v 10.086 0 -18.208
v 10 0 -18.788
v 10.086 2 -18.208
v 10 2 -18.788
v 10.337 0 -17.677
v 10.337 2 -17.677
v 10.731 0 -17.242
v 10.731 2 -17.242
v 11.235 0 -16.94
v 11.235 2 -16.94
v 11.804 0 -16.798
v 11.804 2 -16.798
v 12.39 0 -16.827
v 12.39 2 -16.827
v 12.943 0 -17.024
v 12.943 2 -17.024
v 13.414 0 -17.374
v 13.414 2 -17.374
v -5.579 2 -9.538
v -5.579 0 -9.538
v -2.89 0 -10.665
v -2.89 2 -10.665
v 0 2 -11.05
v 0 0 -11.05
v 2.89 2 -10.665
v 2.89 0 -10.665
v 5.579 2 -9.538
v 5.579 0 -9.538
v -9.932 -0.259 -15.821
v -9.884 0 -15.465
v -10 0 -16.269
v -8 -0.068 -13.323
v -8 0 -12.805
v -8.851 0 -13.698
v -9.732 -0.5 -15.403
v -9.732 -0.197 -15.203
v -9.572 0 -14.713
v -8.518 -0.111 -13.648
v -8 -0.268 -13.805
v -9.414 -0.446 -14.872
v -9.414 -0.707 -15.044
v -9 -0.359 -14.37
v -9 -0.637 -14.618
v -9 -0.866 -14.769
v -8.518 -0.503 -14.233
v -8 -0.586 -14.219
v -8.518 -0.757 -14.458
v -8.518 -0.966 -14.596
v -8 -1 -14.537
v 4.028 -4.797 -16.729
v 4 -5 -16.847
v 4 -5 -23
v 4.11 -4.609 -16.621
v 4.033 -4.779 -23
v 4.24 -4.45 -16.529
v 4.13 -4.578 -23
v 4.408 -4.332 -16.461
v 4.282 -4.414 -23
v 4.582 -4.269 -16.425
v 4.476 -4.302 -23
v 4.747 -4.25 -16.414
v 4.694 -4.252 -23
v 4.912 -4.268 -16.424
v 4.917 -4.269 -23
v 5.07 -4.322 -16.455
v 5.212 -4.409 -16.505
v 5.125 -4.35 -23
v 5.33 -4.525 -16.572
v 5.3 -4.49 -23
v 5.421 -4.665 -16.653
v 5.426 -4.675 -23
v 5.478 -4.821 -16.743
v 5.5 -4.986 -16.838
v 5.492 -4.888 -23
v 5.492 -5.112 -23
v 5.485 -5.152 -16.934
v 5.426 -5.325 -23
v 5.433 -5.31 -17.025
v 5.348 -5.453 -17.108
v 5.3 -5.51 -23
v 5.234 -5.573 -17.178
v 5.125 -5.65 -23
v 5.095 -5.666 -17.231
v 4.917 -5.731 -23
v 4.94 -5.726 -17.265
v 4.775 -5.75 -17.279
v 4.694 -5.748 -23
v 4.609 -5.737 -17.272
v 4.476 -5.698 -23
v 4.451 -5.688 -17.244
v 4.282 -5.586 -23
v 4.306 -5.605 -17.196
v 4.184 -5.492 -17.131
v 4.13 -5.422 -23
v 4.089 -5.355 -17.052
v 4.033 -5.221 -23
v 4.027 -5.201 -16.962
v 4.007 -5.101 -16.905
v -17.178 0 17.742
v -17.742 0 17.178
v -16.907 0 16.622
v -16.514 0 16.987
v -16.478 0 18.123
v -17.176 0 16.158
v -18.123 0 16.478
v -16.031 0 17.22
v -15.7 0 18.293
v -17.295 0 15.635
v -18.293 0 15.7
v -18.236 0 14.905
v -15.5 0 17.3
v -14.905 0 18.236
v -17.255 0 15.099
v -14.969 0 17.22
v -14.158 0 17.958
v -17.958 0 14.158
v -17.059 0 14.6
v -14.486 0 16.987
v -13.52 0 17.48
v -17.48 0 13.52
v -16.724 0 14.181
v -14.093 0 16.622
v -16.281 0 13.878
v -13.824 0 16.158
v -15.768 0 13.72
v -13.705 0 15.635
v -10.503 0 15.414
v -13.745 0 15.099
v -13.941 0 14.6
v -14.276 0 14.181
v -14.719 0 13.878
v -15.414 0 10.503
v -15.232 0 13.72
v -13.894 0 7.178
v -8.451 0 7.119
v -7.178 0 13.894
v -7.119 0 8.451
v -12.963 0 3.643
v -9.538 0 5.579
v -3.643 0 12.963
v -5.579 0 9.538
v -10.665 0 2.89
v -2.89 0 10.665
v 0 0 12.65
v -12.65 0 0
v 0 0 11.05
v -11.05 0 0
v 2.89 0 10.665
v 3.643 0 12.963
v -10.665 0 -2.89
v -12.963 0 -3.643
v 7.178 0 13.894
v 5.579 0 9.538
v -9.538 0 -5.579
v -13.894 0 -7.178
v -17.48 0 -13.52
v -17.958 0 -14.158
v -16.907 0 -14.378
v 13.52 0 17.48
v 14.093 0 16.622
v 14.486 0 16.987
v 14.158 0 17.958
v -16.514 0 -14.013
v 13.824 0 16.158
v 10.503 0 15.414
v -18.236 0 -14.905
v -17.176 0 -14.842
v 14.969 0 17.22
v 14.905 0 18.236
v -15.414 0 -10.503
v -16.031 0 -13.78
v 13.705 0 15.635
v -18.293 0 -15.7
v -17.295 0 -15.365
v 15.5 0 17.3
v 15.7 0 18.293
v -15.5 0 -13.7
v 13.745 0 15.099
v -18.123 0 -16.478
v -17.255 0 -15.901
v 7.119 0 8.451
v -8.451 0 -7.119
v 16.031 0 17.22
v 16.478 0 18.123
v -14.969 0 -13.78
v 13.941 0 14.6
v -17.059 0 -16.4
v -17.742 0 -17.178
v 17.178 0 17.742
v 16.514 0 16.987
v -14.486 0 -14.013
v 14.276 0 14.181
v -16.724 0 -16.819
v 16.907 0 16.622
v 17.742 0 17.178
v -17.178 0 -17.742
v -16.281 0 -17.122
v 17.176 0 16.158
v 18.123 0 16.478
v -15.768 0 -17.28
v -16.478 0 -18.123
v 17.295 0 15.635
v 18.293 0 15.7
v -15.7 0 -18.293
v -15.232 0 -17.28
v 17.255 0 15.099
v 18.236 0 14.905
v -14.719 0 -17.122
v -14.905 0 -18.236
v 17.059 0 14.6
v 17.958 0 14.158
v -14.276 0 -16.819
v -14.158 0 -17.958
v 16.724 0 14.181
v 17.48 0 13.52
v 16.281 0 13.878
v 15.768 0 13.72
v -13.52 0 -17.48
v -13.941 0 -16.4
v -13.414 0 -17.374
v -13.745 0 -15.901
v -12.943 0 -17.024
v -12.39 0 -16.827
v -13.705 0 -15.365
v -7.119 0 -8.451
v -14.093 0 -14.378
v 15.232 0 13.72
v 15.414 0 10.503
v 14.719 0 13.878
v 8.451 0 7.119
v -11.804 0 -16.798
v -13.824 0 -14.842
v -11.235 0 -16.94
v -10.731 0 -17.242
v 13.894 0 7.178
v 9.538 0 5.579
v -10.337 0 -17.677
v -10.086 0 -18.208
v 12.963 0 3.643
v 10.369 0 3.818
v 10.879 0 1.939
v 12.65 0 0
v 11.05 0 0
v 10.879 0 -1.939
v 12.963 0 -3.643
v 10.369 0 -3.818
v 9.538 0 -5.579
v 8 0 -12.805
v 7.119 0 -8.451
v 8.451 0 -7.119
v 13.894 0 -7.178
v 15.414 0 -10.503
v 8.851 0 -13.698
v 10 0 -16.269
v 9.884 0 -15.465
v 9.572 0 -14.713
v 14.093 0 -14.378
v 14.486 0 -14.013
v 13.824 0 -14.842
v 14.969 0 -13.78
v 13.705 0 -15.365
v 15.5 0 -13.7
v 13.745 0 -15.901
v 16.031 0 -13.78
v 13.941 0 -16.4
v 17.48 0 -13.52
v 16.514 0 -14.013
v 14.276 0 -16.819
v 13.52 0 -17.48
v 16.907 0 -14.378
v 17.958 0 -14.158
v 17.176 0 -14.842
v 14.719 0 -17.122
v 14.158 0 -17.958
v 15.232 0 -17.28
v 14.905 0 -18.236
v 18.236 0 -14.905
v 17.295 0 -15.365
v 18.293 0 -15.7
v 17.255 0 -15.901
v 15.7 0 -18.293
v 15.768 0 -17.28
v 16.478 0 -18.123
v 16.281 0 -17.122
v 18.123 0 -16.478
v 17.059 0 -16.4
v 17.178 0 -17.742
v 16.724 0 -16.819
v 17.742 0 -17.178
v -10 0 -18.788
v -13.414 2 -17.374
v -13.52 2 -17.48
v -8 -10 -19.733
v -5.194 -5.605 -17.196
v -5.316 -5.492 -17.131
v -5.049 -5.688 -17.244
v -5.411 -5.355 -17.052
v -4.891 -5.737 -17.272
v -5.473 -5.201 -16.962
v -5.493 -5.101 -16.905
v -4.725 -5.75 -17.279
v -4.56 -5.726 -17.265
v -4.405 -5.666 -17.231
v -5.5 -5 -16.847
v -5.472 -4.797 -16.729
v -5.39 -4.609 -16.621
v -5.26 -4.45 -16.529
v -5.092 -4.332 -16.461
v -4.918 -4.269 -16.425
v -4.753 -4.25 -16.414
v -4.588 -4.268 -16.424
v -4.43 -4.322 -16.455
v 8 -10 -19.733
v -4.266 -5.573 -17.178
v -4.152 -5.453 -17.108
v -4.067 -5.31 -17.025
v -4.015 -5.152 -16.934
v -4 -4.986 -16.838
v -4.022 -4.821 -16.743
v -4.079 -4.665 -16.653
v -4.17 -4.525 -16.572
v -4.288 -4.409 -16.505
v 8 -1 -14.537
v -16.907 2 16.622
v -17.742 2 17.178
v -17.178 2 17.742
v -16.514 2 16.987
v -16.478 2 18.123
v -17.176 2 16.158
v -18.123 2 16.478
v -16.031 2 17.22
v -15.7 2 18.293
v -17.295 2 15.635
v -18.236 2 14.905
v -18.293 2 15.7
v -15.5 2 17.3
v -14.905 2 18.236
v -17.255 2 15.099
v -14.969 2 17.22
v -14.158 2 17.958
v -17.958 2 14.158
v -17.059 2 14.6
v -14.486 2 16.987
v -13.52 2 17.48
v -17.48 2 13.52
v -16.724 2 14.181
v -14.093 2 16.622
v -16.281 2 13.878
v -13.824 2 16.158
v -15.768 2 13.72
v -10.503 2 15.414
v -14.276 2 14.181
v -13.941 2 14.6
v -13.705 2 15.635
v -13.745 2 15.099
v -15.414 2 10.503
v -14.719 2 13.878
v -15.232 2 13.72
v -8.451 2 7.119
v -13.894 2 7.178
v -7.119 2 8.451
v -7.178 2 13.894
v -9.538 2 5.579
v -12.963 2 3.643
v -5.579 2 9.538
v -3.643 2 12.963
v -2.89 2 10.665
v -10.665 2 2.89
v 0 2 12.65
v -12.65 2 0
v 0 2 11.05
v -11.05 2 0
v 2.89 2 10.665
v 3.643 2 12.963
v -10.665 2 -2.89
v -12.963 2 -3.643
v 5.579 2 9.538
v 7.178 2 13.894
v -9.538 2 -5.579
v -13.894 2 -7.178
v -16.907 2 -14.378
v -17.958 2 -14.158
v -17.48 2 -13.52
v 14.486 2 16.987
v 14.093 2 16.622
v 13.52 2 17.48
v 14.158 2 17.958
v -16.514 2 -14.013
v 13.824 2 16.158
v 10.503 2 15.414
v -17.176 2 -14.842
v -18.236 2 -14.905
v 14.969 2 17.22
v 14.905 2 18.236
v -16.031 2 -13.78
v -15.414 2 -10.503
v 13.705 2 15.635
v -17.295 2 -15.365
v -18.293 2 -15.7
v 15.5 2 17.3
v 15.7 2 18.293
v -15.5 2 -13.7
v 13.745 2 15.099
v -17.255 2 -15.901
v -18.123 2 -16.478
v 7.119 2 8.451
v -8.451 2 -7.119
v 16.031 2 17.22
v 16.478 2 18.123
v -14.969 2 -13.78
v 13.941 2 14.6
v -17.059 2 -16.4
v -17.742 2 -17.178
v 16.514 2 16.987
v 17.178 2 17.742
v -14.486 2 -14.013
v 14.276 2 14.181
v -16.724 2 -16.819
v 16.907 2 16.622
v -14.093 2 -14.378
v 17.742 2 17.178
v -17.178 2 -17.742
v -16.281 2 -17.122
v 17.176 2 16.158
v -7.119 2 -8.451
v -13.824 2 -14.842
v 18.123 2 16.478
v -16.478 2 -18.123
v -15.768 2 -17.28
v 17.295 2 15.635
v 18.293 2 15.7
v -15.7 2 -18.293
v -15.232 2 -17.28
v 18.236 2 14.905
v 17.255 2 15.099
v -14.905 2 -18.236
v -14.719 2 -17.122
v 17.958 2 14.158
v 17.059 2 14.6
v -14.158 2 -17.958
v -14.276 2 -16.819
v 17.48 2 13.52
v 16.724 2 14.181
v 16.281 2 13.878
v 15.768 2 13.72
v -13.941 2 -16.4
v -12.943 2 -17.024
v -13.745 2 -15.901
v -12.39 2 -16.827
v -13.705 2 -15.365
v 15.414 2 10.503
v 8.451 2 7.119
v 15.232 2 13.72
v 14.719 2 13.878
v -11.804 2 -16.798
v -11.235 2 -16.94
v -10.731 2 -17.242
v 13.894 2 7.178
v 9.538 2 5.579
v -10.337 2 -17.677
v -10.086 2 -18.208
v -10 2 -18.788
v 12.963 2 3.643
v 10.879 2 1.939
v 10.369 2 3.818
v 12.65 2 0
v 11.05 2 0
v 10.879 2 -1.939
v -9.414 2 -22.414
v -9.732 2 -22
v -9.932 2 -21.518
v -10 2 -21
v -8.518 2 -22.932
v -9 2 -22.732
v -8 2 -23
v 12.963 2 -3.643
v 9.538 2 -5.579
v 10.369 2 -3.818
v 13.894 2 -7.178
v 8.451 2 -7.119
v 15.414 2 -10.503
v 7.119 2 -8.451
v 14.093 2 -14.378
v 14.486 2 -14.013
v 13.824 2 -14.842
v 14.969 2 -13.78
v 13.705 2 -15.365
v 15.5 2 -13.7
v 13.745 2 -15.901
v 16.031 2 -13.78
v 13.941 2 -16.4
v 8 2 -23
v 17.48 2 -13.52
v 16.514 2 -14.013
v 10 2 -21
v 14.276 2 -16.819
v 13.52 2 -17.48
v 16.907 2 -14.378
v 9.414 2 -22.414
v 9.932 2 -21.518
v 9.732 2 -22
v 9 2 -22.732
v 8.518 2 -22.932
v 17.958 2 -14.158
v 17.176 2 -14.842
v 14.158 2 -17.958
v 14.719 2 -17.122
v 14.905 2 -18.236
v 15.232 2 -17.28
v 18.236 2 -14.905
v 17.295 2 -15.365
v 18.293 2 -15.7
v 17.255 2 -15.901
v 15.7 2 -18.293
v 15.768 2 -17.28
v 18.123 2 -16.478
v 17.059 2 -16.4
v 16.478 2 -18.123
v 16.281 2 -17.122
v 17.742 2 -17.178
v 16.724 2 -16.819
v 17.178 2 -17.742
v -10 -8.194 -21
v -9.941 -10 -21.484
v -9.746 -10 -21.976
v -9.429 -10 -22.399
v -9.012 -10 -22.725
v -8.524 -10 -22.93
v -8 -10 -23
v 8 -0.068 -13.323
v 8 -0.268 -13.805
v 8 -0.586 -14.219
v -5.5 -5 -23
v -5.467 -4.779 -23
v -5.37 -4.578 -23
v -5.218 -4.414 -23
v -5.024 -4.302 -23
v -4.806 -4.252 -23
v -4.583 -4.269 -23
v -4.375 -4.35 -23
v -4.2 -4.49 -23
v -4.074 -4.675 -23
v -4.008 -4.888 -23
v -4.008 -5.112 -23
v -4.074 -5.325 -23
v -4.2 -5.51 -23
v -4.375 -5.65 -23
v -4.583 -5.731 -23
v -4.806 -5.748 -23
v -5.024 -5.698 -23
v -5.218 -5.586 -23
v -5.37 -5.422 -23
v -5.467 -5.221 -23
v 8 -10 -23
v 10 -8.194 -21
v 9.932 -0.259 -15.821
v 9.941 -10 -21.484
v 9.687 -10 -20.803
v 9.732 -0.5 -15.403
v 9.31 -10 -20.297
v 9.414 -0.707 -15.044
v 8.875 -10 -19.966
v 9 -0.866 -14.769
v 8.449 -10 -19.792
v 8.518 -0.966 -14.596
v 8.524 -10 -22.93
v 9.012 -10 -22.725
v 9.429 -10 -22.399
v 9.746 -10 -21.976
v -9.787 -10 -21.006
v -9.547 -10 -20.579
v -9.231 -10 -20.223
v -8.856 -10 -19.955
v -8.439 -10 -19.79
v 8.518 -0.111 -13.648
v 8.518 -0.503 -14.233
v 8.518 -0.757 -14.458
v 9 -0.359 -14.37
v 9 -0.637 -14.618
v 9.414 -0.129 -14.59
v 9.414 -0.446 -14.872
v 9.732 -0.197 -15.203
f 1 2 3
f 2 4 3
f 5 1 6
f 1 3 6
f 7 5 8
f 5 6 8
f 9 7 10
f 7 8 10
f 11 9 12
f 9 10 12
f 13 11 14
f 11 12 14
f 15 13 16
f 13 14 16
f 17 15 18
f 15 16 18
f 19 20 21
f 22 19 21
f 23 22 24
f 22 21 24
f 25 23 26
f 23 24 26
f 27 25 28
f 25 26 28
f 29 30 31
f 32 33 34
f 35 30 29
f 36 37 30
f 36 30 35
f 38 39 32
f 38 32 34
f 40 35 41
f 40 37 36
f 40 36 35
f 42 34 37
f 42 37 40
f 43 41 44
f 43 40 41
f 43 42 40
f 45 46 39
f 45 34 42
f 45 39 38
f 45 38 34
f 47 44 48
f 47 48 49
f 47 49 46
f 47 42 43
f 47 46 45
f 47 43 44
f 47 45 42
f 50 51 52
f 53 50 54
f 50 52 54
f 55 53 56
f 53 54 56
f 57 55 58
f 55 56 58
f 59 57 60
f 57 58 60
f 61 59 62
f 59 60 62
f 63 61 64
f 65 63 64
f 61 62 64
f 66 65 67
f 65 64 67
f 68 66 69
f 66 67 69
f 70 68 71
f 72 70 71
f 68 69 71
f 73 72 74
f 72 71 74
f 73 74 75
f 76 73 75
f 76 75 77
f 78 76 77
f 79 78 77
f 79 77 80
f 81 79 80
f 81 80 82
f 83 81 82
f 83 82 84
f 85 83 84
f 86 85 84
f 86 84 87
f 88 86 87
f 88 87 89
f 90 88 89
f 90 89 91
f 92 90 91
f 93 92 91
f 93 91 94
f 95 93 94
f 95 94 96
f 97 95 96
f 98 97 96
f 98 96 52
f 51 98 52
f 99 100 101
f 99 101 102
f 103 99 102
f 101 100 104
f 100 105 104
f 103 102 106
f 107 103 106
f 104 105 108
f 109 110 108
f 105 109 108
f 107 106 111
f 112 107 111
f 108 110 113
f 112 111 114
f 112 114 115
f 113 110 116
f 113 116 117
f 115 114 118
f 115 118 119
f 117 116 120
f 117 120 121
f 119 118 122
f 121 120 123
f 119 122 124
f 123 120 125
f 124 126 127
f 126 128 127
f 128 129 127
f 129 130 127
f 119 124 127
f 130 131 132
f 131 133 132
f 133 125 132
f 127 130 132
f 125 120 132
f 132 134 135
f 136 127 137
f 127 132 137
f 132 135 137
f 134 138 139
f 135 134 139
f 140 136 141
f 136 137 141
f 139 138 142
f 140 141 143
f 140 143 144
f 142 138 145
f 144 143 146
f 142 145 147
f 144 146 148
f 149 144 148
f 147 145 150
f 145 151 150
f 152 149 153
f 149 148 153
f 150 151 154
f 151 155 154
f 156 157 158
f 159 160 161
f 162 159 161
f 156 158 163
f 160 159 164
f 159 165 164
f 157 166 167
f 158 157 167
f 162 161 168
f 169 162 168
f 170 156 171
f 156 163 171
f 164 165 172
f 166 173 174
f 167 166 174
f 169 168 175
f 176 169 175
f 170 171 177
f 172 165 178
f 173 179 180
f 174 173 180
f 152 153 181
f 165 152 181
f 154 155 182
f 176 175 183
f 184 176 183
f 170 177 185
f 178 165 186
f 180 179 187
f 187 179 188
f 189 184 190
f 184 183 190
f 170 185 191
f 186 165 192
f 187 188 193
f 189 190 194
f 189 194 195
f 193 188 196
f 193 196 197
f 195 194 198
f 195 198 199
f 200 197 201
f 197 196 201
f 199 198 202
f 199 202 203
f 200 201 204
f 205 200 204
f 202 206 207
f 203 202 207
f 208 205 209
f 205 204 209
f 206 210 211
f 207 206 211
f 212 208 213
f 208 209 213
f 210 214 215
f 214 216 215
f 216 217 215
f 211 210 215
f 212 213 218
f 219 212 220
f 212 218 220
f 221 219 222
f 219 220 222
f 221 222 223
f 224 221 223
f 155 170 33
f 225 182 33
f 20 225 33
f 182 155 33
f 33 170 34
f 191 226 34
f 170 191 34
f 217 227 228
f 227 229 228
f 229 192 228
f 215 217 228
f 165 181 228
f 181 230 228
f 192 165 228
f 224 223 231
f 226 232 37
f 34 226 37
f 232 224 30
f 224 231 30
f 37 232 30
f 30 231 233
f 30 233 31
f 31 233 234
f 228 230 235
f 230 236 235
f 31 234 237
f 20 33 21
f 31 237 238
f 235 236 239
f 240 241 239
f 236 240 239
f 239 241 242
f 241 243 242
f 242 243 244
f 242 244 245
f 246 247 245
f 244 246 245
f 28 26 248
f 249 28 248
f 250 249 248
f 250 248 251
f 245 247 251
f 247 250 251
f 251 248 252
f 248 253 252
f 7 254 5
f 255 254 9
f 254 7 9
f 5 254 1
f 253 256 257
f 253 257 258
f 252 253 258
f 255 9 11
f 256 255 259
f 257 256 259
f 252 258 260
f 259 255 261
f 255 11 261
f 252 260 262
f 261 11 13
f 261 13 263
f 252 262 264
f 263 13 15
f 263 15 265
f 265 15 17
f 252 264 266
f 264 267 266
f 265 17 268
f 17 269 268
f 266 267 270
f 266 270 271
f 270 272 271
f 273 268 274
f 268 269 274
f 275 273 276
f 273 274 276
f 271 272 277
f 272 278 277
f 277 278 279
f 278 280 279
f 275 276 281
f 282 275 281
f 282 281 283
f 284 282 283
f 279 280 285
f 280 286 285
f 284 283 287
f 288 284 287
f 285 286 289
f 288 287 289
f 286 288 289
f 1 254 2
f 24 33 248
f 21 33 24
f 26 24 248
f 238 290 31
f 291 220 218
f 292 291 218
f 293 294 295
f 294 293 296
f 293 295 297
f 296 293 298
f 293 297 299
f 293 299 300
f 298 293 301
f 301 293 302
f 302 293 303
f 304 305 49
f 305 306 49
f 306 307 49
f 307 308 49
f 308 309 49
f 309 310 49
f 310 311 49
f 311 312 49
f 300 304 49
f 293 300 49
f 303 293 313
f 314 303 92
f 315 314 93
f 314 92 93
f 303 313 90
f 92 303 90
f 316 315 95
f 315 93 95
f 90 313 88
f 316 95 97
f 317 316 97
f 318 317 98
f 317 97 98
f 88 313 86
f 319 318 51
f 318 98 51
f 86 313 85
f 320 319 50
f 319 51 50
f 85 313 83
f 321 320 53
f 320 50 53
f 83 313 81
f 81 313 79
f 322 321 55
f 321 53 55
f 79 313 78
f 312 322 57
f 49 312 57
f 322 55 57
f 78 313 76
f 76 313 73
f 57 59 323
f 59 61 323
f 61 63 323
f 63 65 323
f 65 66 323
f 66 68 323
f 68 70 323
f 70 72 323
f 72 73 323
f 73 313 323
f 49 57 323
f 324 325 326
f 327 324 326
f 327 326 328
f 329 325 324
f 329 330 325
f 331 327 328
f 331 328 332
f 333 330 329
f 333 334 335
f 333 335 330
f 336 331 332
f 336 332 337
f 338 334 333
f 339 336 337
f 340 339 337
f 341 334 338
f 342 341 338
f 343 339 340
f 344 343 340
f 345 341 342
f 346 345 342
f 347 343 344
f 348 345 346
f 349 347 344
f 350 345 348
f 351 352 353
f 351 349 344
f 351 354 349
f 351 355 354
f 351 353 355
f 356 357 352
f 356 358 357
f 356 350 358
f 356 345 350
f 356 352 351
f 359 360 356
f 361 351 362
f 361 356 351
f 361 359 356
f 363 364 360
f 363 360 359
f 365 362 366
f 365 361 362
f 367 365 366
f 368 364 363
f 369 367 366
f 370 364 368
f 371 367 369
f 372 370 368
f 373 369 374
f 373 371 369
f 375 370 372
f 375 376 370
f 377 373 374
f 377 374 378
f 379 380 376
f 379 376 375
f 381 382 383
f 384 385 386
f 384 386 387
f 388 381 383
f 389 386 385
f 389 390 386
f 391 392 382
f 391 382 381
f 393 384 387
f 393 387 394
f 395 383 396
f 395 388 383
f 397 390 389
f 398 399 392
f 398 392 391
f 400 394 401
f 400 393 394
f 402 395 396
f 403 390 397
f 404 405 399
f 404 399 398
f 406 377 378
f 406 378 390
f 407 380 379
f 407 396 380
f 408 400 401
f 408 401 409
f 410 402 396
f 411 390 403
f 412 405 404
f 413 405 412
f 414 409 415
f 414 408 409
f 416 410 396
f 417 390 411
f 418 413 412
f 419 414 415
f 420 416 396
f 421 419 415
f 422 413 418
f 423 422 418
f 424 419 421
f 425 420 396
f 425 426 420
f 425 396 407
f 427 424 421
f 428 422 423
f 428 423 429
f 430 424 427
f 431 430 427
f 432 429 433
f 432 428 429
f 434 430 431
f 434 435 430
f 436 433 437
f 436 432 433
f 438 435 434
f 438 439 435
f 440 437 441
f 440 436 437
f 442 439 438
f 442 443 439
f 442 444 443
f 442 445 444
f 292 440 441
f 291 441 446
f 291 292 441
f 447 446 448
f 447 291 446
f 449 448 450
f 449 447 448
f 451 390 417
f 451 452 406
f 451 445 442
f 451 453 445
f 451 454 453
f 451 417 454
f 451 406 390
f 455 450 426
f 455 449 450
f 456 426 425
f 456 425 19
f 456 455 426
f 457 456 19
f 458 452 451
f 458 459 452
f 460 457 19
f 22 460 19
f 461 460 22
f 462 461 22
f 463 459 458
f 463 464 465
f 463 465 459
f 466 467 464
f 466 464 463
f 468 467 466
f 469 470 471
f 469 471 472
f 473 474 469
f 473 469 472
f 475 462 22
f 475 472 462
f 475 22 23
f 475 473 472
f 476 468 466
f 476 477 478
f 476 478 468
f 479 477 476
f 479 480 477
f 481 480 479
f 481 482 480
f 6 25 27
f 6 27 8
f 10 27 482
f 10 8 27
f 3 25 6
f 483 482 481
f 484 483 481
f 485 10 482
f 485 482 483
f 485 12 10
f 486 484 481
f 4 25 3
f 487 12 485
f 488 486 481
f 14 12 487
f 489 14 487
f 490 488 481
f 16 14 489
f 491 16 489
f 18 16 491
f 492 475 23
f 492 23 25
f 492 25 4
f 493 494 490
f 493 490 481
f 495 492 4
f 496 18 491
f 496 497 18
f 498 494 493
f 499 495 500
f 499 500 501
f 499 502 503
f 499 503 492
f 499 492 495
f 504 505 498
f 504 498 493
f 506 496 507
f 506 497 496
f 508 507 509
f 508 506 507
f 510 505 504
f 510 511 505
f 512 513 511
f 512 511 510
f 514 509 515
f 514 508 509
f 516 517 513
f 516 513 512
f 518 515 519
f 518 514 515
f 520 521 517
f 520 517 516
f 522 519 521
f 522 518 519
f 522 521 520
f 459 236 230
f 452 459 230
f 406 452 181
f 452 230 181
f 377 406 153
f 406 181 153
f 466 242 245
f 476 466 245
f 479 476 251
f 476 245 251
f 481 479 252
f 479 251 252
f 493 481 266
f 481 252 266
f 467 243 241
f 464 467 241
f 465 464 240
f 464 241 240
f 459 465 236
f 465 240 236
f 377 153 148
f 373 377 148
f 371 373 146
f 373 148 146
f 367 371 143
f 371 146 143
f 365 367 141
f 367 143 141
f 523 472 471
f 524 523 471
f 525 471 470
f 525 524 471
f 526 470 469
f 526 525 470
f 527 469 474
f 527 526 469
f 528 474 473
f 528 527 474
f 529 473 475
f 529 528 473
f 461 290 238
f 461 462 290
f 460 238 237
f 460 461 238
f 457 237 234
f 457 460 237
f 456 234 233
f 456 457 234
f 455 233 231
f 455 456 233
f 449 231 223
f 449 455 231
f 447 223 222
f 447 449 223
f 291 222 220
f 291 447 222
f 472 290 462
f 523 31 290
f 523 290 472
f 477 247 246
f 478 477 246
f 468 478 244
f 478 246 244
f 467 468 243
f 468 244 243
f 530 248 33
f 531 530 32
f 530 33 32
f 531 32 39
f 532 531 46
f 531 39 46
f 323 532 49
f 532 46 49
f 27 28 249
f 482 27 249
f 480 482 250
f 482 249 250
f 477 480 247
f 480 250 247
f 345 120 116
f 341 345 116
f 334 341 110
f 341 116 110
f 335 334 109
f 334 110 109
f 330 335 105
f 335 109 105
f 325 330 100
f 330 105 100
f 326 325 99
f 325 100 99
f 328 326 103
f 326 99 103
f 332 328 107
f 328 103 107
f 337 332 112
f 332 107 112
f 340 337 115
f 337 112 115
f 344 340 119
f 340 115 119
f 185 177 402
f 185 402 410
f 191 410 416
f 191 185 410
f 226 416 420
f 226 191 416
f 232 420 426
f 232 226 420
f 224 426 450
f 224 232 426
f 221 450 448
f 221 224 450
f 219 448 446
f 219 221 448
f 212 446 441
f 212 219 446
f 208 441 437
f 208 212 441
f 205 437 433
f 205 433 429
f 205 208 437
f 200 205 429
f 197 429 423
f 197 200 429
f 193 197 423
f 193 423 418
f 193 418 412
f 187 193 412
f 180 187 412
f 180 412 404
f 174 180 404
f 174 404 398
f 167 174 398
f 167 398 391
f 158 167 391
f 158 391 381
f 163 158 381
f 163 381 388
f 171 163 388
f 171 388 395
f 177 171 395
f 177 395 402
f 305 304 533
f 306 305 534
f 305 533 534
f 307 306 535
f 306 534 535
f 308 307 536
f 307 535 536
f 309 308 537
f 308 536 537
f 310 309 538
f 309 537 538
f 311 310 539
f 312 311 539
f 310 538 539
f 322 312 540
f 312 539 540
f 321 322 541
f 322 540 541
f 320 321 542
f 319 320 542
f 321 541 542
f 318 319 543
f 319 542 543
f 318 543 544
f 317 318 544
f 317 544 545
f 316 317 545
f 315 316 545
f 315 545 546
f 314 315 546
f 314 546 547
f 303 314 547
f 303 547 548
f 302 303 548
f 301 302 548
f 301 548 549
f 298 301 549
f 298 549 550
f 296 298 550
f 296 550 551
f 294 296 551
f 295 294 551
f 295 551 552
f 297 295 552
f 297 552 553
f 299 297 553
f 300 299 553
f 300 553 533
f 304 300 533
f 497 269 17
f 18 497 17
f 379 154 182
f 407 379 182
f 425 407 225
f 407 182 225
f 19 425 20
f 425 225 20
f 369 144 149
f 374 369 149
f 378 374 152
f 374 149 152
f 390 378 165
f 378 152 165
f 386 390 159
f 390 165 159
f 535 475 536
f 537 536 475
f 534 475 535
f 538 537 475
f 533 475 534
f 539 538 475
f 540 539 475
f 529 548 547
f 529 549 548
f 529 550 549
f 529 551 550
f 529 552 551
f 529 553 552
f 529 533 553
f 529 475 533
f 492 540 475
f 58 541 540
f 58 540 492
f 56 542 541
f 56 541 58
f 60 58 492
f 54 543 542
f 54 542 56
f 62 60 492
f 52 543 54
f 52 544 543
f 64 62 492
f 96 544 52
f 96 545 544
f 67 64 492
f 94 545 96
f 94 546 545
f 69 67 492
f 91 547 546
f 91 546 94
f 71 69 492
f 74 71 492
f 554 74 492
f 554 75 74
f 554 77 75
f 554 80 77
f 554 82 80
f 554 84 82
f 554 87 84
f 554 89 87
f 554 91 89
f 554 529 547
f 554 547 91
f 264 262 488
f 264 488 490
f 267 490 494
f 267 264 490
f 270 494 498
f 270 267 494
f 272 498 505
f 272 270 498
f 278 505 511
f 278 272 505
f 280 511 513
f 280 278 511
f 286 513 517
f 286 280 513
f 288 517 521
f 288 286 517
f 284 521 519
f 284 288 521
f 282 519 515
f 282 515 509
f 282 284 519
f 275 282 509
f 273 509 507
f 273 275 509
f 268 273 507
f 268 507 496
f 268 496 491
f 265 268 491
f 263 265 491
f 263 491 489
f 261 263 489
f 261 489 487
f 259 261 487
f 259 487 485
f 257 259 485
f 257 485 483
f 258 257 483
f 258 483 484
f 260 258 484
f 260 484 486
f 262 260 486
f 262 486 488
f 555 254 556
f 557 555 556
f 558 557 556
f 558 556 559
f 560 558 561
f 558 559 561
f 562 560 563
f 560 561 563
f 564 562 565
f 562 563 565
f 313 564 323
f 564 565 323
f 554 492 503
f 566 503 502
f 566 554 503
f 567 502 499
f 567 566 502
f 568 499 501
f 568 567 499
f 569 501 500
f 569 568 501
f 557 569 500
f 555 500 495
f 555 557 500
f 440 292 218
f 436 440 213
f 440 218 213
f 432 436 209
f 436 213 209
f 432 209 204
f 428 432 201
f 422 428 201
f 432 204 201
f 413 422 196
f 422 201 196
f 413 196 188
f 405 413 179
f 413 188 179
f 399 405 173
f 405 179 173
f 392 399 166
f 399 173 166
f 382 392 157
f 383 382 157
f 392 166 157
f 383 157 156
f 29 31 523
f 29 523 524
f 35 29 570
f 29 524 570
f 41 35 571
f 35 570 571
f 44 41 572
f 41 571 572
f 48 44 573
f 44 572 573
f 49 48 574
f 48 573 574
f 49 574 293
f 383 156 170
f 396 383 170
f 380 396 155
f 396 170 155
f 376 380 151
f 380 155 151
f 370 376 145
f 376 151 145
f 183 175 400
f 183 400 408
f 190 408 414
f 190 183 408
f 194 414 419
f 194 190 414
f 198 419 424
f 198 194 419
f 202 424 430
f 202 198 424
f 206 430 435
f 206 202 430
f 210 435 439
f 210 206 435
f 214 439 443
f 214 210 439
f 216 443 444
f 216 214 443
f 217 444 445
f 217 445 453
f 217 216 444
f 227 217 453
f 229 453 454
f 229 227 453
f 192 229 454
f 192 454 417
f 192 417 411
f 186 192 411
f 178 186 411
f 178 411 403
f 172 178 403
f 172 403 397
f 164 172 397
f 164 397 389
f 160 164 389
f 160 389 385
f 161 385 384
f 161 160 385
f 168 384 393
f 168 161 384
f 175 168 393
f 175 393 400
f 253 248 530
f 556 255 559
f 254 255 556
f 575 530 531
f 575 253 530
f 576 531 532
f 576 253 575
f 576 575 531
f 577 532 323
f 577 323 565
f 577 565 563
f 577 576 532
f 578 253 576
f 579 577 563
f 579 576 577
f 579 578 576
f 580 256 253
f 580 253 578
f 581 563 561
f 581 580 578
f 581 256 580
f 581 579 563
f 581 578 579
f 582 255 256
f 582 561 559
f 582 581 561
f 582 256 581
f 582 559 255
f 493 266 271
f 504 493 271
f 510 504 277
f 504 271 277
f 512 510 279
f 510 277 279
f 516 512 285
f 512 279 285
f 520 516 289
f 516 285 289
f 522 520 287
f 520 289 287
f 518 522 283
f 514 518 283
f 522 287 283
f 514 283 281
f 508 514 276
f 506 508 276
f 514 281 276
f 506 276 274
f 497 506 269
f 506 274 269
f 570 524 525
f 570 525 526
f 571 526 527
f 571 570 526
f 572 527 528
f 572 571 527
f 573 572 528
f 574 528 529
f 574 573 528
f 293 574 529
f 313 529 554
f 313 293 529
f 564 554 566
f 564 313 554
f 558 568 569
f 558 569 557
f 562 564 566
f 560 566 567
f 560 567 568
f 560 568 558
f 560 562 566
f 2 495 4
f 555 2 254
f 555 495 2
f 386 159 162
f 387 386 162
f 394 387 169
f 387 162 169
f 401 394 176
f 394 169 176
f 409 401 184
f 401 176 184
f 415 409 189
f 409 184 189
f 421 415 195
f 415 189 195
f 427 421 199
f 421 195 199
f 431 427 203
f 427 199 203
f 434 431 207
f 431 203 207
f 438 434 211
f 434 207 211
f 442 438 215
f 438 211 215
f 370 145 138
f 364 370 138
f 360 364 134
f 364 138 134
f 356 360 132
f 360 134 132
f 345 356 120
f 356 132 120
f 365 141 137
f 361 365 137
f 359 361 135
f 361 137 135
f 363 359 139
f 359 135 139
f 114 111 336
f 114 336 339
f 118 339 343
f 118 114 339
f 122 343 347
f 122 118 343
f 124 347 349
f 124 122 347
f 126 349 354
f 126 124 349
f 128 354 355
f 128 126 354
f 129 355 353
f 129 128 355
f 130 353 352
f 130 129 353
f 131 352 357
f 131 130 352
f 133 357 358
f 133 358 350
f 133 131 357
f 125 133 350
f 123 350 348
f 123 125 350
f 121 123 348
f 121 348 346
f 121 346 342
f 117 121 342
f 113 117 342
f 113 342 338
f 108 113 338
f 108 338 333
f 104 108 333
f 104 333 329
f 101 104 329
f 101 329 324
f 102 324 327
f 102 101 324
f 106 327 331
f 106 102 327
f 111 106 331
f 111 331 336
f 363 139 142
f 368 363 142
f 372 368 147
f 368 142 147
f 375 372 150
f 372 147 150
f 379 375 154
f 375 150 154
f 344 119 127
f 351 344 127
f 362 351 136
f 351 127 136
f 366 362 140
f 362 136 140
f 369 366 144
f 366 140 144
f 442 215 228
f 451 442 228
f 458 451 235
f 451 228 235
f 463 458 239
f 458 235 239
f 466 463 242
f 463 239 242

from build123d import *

# Parameters (mm, degrees)
SKETCH_1_R          = 1.8
EXTRUDE_1_DEPTH     = 2
EXTRUDE_START       = 10
EXTRUDE_2_DEPTH     = 10
SKETCH_3_R          = 0.75
CUT_EXTRUDE_1_DEPTH = 10
FILLET_3_R          = 2
CHAMFER_1_SIZE      = 5.773502692
CHAMFER_1_SIZE_2    = 10
FILLET_1_R          = 2
FILLET_2_R          = 2


with BuildPart() as part:
    # 草图1 → 凸台-拉伸1 (new body)
    # profile 1 of 19: a face of its own
    with BuildSketch(Plane(origin=(0, 0, 0), x_dir=(1, 0, 0), z_dir=(0, 1, 0))):
        with BuildLine():
            ThreePointArc((17.479898987, 13.520101013), (17.479898987, 17.479898987), (13.520101013, 17.479898987))
            Line((13.520101013, 17.479898987), (10, 13.959797975))
            Line((10, 13.959797975), (6.743130876, 10.702928851))
            ThreePointArc((6.743130876, 10.702928851), (8.944900782, 8.944900782), (10.702928851, 6.743130876))
            Line((10.702928851, 6.743130876), (17.479898987, 13.520101013))
        make_face()
        with Locations(Location((15.5, 15.5, 0), (0, 0, 270))):
            Circle(SKETCH_1_R, mode=Mode.SUBTRACT)
    # profile 2 of 19: a face of its own
    with BuildSketch(Plane(origin=(0, 0, 0), x_dir=(1, 0, 0), z_dir=(0, 1, 0))):
        with BuildLine():
            ThreePointArc((10.702928851, 6.743130876), (8.944900782, 8.944900782), (6.743130876, 10.702928851))
            Line((6.743130876, 10.702928851), (5.578622694, 9.538420668))
            ThreePointArc((5.578622694, 9.538420668), (7.813529932, 7.813529932), (9.538420668, 5.578622694))
            Line((9.538420668, 5.578622694), (10.702928851, 6.743130876))
        make_face()
    # profile 3 of 19: a face of its own
    with BuildSketch(Plane(origin=(0, 0, 0), x_dir=(1, 0, 0), z_dir=(0, 1, 0))):
        with BuildLine():
            Line((5.578622694, 9.538420668), (6.743130876, 10.702928851))
            ThreePointArc((6.743130876, 10.702928851), (0, 12.65), (-6.743130876, 10.702928851))
            Line((-6.743130876, 10.702928851), (-5.578622694, 9.538420668))
            ThreePointArc((-5.578622694, 9.538420668), (0, 11.05), (5.578622694, 9.538420668))
        make_face()
    # profile 4 of 19: a face of its own
    with BuildSketch(Plane(origin=(0, 0, 0), x_dir=(1, 0, 0), z_dir=(0, 1, 0))):
        with BuildLine():
            ThreePointArc((12.65, 0), (12.153488182, 3.509305489), (10.702928851, 6.743130876))
            Line((10.702928851, 6.743130876), (9.538420668, 5.578622694))
            ThreePointArc((9.538420668, 5.578622694), (10.665412519, 2.889892006), (11.05, 0))
            ThreePointArc((11.05, 0), (10.665412519, -2.889892006), (9.538420668, -5.578622694))
            Line((9.538420668, -5.578622694), (10.702928851, -6.743130876))
            ThreePointArc((10.702928851, -6.743130876), (12.153488182, -3.509305489), (12.65, 0))
        make_face()
    # profile 5 of 19: a face of its own
    with BuildSketch(Plane(origin=(0, 0, 0), x_dir=(1, 0, 0), z_dir=(0, 1, 0))):
        with BuildLine():
            ThreePointArc((6.743130876, -10.702928851), (8.944900782, -8.944900782), (10.702928851, -6.743130876))
            Line((10.702928851, -6.743130876), (9.538420668, -5.578622694))
            ThreePointArc((9.538420668, -5.578622694), (7.813529932, -7.813529932), (5.578622694, -9.538420668))
            Line((5.578622694, -9.538420668), (6.743130876, -10.702928851))
        make_face()
    # profile 6 of 19: a face of its own
    with BuildSketch(Plane(origin=(0, 0, 0), x_dir=(1, 0, 0), z_dir=(0, 1, 0))):
        with BuildLine():
            ThreePointArc((0, -12.65), (3.50930549, -12.153488182), (6.743130876, -10.702928851))
            Line((6.743130876, -10.702928851), (5.578622694, -9.538420668))
            ThreePointArc((5.578622694, -9.538420668), (0, -11.05), (-5.578622694, -9.538420668))
            Line((-5.578622694, -9.538420668), (-6.743130876, -10.702928851))
            ThreePointArc((-6.743130876, -10.702928851), (-3.509305489, -12.153488182), (0, -12.65))
        make_face()
    # profile 7 of 19: a face of its own
    with BuildSketch(Plane(origin=(0, 0, 0), x_dir=(1, 0, 0), z_dir=(0, 1, 0))):
        with BuildLine():
            Line((17.479898987, -13.520101013), (10.702928851, -6.743130876))
            ThreePointArc((10.702928851, -6.743130876), (8.944900782, -8.944900782), (6.743130876, -10.702928851))
            Line((6.743130876, -10.702928851), (13.520101013, -17.479898987))
            ThreePointArc((13.520101013, -17.479898987), (17.479898987, -17.479898987), (17.479898987, -13.520101013))
        make_face()
        with Locations(Location((15.5, -15.5, 0), (0, 0, 270))):
            Circle(SKETCH_1_R, mode=Mode.SUBTRACT)
    # profile 8 of 19: a face of its own
    with BuildSketch(Plane(origin=(0, 0, 0), x_dir=(1, 0, 0), z_dir=(0, 1, 0))):
        with BuildLine():
            ThreePointArc((-6.743130876, -10.702928851), (-8.944900782, -8.944900782), (-10.702928851, -6.743130876))
            Line((-10.702928851, -6.743130876), (-17.479898987, -13.520101013))
            ThreePointArc((-17.479898987, -13.520101013), (-17.479898987, -17.479898987), (-13.520101013, -17.479898987))
            Line((-13.520101013, -17.479898987), (-6.743130876, -10.702928851))
        make_face()
        with Locations(Location((-15.5, -15.5, 0), (0, 0, 270))):
            Circle(SKETCH_1_R, mode=Mode.SUBTRACT)
    # profile 9 of 19: a face of its own
    with BuildSketch(Plane(origin=(0, 0, 0), x_dir=(1, 0, 0), z_dir=(0, 1, 0))):
        with BuildLine():
            Line((13.520101013, -17.479898987), (6.743130876, -10.702928851))
            ThreePointArc((6.743130876, -10.702928851), (3.50930549, -12.153488182), (0, -12.65))
            ThreePointArc((0, -12.65), (7.178458324, -13.893720868), (13.520101013, -17.479898987))
        make_face()
    # profile 10 of 19: a face of its own
    with BuildSketch(Plane(origin=(0, 0, 0), x_dir=(1, 0, 0), z_dir=(0, 1, 0))):
        with BuildLine():
            ThreePointArc((-13.520101013, -17.479898987), (-7.178458324, -13.893720867), (0, -12.65))
            ThreePointArc((0, -12.65), (-3.509305489, -12.153488182), (-6.743130876, -10.702928851))
            Line((-6.743130876, -10.702928851), (-13.520101013, -17.479898987))
        make_face()
    # profile 11 of 19: a face of its own
    with BuildSketch(Plane(origin=(0, 0, 0), x_dir=(1, 0, 0), z_dir=(0, 1, 0))):
        with BuildLine():
            ThreePointArc((17.479898987, -13.520101013), (13.893720868, -7.178458324), (12.65, 0))
            ThreePointArc((12.65, 0), (12.153488182, -3.509305489), (10.702928851, -6.743130876))
            Line((10.702928851, -6.743130876), (17.479898987, -13.520101013))
        make_face()
    # profile 12 of 19: a face of its own
    with BuildSketch(Plane(origin=(0, 0, 0), x_dir=(1, 0, 0), z_dir=(0, 1, 0))):
        with BuildLine():
            ThreePointArc((12.65, 0), (13.893720868, 7.178458324), (17.479898987, 13.520101013))
            Line((17.479898987, 13.520101013), (10.702928851, 6.743130876))
            ThreePointArc((10.702928851, 6.743130876), (12.153488182, 3.509305489), (12.65, 0))
        make_face()
    # profile 13 of 19: a face of its own
    with BuildSketch(Plane(origin=(0, 0, 0), x_dir=(1, 0, 0), z_dir=(0, 1, 0))):
        with BuildLine():
            ThreePointArc((-12.65, 2.4e-08), (-12.153488178, 3.509305501), (-10.702928851, 6.743130876))
            Line((-10.702928851, 6.743130876), (-17.479898987, 13.520101013))
            ThreePointArc((-17.479898987, 13.520101013), (-13.893720872, 7.178458335), (-12.65, 2.4e-08))
        make_face()
    # profile 14 of 19: a face of its own
    with BuildSketch(Plane(origin=(0, 0, 0), x_dir=(1, 0, 0), z_dir=(0, 1, 0))):
        with BuildLine():
            ThreePointArc((-10.702928851, -6.743130876), (-12.153488185, -3.509305478), (-12.65, 2.4e-08))
            ThreePointArc((-12.65, 2.4e-08), (-13.893720864, -7.178458313), (-17.479898987, -13.520101013))
            Line((-17.479898987, -13.520101013), (-10.702928851, -6.743130876))
        make_face()
    # profile 15 of 19: a face of its own
    with BuildSketch(Plane(origin=(0, 0, 0), x_dir=(1, 0, 0), z_dir=(0, 1, 0))):
        with BuildLine():
            ThreePointArc((-10.702928851, 6.743130876), (-8.944900782, 8.944900782), (-6.743130876, 10.702928851))
            Line((-6.743130876, 10.702928851), (-10, 13.959797975))
            Line((-10, 13.959797975), (-13.520101013, 17.479898987))
            ThreePointArc((-13.520101013, 17.479898987), (-17.479898987, 17.479898987), (-17.479898987, 13.520101013))
            Line((-17.479898987, 13.520101013), (-10.702928851, 6.743130876))
        make_face()
        with Locations(Location((-15.5, 15.5, 0), (0, 0, 270))):
            Circle(SKETCH_1_R, mode=Mode.SUBTRACT)
    # profile 16 of 19: a face of its own
    with BuildSketch(Plane(origin=(0, 0, 0), x_dir=(1, 0, 0), z_dir=(0, 1, 0))):
        with BuildLine():
            Line((-5.578622694, 9.538420668), (-6.743130876, 10.702928851))
            ThreePointArc((-6.743130876, 10.702928851), (-8.944900782, 8.944900782), (-10.702928851, 6.743130876))
            Line((-10.702928851, 6.743130876), (-9.538420668, 5.578622694))
            ThreePointArc((-9.538420668, 5.578622694), (-7.813529932, 7.813529932), (-5.578622694, 9.538420668))
        make_face()
    # profile 17 of 19: a face of its own
    with BuildSketch(Plane(origin=(0, 0, 0), x_dir=(1, 0, 0), z_dir=(0, 1, 0))):
        with BuildLine():
            Line((-9.538420668, 5.578622694), (-10.702928851, 6.743130876))
            ThreePointArc((-10.702928851, 6.743130876), (-12.153488178, 3.509305501), (-12.65, 2.4e-08))
            ThreePointArc((-12.65, 2.4e-08), (-12.153488185, -3.509305478), (-10.702928851, -6.743130876))
            Line((-10.702928851, -6.743130876), (-9.538420668, -5.578622694))
            ThreePointArc((-9.538420668, -5.578622694), (-11.05, 0), (-9.538420668, 5.578622694))
        make_face()
    # profile 18 of 19: a face of its own
    with BuildSketch(Plane(origin=(0, 0, 0), x_dir=(1, 0, 0), z_dir=(0, 1, 0))):
        with BuildLine():
            ThreePointArc((-5.578622694, -9.538420668), (-7.813529932, -7.813529932), (-9.538420668, -5.578622694))
            Line((-9.538420668, -5.578622694), (-10.702928851, -6.743130876))
            ThreePointArc((-10.702928851, -6.743130876), (-8.944900782, -8.944900782), (-6.743130876, -10.702928851))
            Line((-6.743130876, -10.702928851), (-5.578622694, -9.538420668))
        make_face()
    # profile 19 of 19: a face of its own
    with BuildSketch(Plane(origin=(0, 0, 0), x_dir=(1, 0, 0), z_dir=(0, 1, 0))):
        with BuildLine():
            Line((6.743130876, 10.702928851), (10, 13.959797975))
            Line((10, 13.959797975), (10, 21))
            ThreePointArc((10, 21), (9.414213562, 22.414213562), (8, 23))
            Line((8, 23), (-8, 23))
            ThreePointArc((-8, 23), (-9.414213562, 22.414213562), (-10, 21))
            Line((-10, 21), (-10, 13.959797975))
            Line((-10, 13.959797975), (-6.743130876, 10.702928851))
            ThreePointArc((-6.743130876, 10.702928851), (0, 12.65), (6.743130876, 10.702928851))
        make_face()
    extrude(amount=EXTRUDE_1_DEPTH)

    # 草图2 → 凸台-拉伸2 (add)
    with BuildSketch(Plane.XZ.offset(EXTRUDE_START)):
        with BuildLine():
            Line((10, -13.959797975), (-10, -13.959797975))
            Line((-10, -13.959797975), (-10, -21))
            ThreePointArc((-10, -21), (-9.414213562, -22.414213562), (-8, -23))
            Line((-8, -23), (8, -23))
            ThreePointArc((8, -23), (9.414213562, -22.414213562), (10, -21))
            Line((10, -21), (10, -13.959797975))
        make_face()
    extrude(amount=-EXTRUDE_2_DEPTH)

    # 草图3 → 切除-拉伸1 (cut)
    with BuildSketch(Plane(origin=(0, 0, -23), x_dir=(-1, 0, 0), z_dir=(0, 0, -1))):
        with Locations((4.75, -5)):
            Circle(SKETCH_3_R)
        with Locations((-4.75, -5)):
            Circle(SKETCH_3_R)
    extrude(amount=-CUT_EXTRUDE_1_DEPTH, mode=Mode.SUBTRACT)

    # 圆角3
    fillet_3_edges = [part.edges().sort_by_distance(p)[0] for p in [
        (-10, 1, -13.959797975),
        (10, 1, -13.959797975),
    ]]
    fillet(fillet_3_edges, radius=FILLET_3_R)

    # 倒角1
    # the kernel refuses this chamfer: 10, 5.773502692 mm, written as the material it takes off along each edge
    with BuildSketch(Plane(origin=(35.870857546, -10, -13.959797975), x_dir=(0, 0, -1), z_dir=(-1, 0, 0))) as chamfer_1_piece_1_section:
        Polygon((CHAMFER_1_SIZE, 0), (0, -CHAMFER_1_SIZE_2), (0, 0), align=None)
    chamfer_1_piece_1 = extrude(amount=71.741715093, mode=Mode.PRIVATE)
    chamfer_1_piece_1 = split(chamfer_1_piece_1, bisect_by=Plane(origin=(35.870857546, 0, -13.959797975), z_dir=(0, -1, 0)), keep=Keep.TOP, mode=Mode.PRIVATE)
    add(chamfer_1_piece_1, mode=Mode.SUBTRACT)

    # 圆角1
    fillet_1_edges = [part.edges().sort_by_distance(p)[0] for p in [
        (0, 0, -13.959797975),
    ]]
    fillet(fillet_1_edges, radius=FILLET_1_R)

    # 圆角2
    # the kernel refuses this fillet: 2 mm, written as the material it takes off along each edge
    with BuildSketch(Plane(origin=(-10, -2, -12.805097436), x_dir=(0, -0.8014106175284074, 0.5981145560114189), z_dir=(0, -0.5981145560114189, -0.8014106175284074))) as fillet_2_piece_1_section:
        with BuildLine():
            CenterArc((2 + FILLET_2_R, -FILLET_2_R), FILLET_2_R, 90, 90)
            Line((2, -FILLET_2_R), (2, 0))
            Line((2, 0), (2 + FILLET_2_R, 0))
        make_face()
    fillet_2_piece_1 = revolve(axis=Axis((-10, -2, -12.805097436), (-1, 0, 0)), revolution_arc=203.265018323, mode=Mode.PRIVATE)
    fillet_2_piece_1 = split(fillet_2_piece_1, bisect_by=Plane(origin=(-10, 0, -12.805097436), z_dir=(0, -1, 0)), keep=Keep.TOP, mode=Mode.PRIVATE)
    add(fillet_2_piece_1, mode=Mode.SUBTRACT)
    with BuildSketch(Plane(origin=(10, -2, -12.805097436), x_dir=(0, -0.8014106175284074, 0.5981145560114189), z_dir=(0, -0.5981145560114189, -0.8014106175284074))) as fillet_2_piece_2_section:
        with BuildLine():
            CenterArc((2 + FILLET_2_R, FILLET_2_R), FILLET_2_R, 180, 90)
            Line((2 + FILLET_2_R, 0), (2, 0))
            Line((2, 0), (2, FILLET_2_R))
        make_face()
    fillet_2_piece_2 = revolve(axis=Axis((10, -2, -12.805097436), (-1, 0, 0)), revolution_arc=203.265018323, mode=Mode.PRIVATE)
    fillet_2_piece_2 = split(fillet_2_piece_2, bisect_by=Plane(origin=(10, 0, -12.805097436), z_dir=(0, -1, 0)), keep=Keep.TOP, mode=Mode.PRIVATE)
    add(fillet_2_piece_2, mode=Mode.SUBTRACT)
    with BuildSketch(Plane(origin=(-10, -14.330127019, -22.233300667), x_dir=(1, 0, 0), z_dir=(0, 0.8660254037805484, 0.5000000000067383)), Plane(origin=(10, -1, -14.537148244), x_dir=(-1, 0, 0), z_dir=(0, -0.8660254037805484, -0.5000000000067383))) as fillet_2_piece_3:
        with BuildLine():
            CenterArc((FILLET_2_R, FILLET_2_R), FILLET_2_R, 180, 90)
            Line((0, FILLET_2_R), (0, 0))
            Line((0, 0), (FILLET_2_R, 0))
        make_face()
    extrude(amount=15.392304845, mode=Mode.SUBTRACT)


solid = part.part
